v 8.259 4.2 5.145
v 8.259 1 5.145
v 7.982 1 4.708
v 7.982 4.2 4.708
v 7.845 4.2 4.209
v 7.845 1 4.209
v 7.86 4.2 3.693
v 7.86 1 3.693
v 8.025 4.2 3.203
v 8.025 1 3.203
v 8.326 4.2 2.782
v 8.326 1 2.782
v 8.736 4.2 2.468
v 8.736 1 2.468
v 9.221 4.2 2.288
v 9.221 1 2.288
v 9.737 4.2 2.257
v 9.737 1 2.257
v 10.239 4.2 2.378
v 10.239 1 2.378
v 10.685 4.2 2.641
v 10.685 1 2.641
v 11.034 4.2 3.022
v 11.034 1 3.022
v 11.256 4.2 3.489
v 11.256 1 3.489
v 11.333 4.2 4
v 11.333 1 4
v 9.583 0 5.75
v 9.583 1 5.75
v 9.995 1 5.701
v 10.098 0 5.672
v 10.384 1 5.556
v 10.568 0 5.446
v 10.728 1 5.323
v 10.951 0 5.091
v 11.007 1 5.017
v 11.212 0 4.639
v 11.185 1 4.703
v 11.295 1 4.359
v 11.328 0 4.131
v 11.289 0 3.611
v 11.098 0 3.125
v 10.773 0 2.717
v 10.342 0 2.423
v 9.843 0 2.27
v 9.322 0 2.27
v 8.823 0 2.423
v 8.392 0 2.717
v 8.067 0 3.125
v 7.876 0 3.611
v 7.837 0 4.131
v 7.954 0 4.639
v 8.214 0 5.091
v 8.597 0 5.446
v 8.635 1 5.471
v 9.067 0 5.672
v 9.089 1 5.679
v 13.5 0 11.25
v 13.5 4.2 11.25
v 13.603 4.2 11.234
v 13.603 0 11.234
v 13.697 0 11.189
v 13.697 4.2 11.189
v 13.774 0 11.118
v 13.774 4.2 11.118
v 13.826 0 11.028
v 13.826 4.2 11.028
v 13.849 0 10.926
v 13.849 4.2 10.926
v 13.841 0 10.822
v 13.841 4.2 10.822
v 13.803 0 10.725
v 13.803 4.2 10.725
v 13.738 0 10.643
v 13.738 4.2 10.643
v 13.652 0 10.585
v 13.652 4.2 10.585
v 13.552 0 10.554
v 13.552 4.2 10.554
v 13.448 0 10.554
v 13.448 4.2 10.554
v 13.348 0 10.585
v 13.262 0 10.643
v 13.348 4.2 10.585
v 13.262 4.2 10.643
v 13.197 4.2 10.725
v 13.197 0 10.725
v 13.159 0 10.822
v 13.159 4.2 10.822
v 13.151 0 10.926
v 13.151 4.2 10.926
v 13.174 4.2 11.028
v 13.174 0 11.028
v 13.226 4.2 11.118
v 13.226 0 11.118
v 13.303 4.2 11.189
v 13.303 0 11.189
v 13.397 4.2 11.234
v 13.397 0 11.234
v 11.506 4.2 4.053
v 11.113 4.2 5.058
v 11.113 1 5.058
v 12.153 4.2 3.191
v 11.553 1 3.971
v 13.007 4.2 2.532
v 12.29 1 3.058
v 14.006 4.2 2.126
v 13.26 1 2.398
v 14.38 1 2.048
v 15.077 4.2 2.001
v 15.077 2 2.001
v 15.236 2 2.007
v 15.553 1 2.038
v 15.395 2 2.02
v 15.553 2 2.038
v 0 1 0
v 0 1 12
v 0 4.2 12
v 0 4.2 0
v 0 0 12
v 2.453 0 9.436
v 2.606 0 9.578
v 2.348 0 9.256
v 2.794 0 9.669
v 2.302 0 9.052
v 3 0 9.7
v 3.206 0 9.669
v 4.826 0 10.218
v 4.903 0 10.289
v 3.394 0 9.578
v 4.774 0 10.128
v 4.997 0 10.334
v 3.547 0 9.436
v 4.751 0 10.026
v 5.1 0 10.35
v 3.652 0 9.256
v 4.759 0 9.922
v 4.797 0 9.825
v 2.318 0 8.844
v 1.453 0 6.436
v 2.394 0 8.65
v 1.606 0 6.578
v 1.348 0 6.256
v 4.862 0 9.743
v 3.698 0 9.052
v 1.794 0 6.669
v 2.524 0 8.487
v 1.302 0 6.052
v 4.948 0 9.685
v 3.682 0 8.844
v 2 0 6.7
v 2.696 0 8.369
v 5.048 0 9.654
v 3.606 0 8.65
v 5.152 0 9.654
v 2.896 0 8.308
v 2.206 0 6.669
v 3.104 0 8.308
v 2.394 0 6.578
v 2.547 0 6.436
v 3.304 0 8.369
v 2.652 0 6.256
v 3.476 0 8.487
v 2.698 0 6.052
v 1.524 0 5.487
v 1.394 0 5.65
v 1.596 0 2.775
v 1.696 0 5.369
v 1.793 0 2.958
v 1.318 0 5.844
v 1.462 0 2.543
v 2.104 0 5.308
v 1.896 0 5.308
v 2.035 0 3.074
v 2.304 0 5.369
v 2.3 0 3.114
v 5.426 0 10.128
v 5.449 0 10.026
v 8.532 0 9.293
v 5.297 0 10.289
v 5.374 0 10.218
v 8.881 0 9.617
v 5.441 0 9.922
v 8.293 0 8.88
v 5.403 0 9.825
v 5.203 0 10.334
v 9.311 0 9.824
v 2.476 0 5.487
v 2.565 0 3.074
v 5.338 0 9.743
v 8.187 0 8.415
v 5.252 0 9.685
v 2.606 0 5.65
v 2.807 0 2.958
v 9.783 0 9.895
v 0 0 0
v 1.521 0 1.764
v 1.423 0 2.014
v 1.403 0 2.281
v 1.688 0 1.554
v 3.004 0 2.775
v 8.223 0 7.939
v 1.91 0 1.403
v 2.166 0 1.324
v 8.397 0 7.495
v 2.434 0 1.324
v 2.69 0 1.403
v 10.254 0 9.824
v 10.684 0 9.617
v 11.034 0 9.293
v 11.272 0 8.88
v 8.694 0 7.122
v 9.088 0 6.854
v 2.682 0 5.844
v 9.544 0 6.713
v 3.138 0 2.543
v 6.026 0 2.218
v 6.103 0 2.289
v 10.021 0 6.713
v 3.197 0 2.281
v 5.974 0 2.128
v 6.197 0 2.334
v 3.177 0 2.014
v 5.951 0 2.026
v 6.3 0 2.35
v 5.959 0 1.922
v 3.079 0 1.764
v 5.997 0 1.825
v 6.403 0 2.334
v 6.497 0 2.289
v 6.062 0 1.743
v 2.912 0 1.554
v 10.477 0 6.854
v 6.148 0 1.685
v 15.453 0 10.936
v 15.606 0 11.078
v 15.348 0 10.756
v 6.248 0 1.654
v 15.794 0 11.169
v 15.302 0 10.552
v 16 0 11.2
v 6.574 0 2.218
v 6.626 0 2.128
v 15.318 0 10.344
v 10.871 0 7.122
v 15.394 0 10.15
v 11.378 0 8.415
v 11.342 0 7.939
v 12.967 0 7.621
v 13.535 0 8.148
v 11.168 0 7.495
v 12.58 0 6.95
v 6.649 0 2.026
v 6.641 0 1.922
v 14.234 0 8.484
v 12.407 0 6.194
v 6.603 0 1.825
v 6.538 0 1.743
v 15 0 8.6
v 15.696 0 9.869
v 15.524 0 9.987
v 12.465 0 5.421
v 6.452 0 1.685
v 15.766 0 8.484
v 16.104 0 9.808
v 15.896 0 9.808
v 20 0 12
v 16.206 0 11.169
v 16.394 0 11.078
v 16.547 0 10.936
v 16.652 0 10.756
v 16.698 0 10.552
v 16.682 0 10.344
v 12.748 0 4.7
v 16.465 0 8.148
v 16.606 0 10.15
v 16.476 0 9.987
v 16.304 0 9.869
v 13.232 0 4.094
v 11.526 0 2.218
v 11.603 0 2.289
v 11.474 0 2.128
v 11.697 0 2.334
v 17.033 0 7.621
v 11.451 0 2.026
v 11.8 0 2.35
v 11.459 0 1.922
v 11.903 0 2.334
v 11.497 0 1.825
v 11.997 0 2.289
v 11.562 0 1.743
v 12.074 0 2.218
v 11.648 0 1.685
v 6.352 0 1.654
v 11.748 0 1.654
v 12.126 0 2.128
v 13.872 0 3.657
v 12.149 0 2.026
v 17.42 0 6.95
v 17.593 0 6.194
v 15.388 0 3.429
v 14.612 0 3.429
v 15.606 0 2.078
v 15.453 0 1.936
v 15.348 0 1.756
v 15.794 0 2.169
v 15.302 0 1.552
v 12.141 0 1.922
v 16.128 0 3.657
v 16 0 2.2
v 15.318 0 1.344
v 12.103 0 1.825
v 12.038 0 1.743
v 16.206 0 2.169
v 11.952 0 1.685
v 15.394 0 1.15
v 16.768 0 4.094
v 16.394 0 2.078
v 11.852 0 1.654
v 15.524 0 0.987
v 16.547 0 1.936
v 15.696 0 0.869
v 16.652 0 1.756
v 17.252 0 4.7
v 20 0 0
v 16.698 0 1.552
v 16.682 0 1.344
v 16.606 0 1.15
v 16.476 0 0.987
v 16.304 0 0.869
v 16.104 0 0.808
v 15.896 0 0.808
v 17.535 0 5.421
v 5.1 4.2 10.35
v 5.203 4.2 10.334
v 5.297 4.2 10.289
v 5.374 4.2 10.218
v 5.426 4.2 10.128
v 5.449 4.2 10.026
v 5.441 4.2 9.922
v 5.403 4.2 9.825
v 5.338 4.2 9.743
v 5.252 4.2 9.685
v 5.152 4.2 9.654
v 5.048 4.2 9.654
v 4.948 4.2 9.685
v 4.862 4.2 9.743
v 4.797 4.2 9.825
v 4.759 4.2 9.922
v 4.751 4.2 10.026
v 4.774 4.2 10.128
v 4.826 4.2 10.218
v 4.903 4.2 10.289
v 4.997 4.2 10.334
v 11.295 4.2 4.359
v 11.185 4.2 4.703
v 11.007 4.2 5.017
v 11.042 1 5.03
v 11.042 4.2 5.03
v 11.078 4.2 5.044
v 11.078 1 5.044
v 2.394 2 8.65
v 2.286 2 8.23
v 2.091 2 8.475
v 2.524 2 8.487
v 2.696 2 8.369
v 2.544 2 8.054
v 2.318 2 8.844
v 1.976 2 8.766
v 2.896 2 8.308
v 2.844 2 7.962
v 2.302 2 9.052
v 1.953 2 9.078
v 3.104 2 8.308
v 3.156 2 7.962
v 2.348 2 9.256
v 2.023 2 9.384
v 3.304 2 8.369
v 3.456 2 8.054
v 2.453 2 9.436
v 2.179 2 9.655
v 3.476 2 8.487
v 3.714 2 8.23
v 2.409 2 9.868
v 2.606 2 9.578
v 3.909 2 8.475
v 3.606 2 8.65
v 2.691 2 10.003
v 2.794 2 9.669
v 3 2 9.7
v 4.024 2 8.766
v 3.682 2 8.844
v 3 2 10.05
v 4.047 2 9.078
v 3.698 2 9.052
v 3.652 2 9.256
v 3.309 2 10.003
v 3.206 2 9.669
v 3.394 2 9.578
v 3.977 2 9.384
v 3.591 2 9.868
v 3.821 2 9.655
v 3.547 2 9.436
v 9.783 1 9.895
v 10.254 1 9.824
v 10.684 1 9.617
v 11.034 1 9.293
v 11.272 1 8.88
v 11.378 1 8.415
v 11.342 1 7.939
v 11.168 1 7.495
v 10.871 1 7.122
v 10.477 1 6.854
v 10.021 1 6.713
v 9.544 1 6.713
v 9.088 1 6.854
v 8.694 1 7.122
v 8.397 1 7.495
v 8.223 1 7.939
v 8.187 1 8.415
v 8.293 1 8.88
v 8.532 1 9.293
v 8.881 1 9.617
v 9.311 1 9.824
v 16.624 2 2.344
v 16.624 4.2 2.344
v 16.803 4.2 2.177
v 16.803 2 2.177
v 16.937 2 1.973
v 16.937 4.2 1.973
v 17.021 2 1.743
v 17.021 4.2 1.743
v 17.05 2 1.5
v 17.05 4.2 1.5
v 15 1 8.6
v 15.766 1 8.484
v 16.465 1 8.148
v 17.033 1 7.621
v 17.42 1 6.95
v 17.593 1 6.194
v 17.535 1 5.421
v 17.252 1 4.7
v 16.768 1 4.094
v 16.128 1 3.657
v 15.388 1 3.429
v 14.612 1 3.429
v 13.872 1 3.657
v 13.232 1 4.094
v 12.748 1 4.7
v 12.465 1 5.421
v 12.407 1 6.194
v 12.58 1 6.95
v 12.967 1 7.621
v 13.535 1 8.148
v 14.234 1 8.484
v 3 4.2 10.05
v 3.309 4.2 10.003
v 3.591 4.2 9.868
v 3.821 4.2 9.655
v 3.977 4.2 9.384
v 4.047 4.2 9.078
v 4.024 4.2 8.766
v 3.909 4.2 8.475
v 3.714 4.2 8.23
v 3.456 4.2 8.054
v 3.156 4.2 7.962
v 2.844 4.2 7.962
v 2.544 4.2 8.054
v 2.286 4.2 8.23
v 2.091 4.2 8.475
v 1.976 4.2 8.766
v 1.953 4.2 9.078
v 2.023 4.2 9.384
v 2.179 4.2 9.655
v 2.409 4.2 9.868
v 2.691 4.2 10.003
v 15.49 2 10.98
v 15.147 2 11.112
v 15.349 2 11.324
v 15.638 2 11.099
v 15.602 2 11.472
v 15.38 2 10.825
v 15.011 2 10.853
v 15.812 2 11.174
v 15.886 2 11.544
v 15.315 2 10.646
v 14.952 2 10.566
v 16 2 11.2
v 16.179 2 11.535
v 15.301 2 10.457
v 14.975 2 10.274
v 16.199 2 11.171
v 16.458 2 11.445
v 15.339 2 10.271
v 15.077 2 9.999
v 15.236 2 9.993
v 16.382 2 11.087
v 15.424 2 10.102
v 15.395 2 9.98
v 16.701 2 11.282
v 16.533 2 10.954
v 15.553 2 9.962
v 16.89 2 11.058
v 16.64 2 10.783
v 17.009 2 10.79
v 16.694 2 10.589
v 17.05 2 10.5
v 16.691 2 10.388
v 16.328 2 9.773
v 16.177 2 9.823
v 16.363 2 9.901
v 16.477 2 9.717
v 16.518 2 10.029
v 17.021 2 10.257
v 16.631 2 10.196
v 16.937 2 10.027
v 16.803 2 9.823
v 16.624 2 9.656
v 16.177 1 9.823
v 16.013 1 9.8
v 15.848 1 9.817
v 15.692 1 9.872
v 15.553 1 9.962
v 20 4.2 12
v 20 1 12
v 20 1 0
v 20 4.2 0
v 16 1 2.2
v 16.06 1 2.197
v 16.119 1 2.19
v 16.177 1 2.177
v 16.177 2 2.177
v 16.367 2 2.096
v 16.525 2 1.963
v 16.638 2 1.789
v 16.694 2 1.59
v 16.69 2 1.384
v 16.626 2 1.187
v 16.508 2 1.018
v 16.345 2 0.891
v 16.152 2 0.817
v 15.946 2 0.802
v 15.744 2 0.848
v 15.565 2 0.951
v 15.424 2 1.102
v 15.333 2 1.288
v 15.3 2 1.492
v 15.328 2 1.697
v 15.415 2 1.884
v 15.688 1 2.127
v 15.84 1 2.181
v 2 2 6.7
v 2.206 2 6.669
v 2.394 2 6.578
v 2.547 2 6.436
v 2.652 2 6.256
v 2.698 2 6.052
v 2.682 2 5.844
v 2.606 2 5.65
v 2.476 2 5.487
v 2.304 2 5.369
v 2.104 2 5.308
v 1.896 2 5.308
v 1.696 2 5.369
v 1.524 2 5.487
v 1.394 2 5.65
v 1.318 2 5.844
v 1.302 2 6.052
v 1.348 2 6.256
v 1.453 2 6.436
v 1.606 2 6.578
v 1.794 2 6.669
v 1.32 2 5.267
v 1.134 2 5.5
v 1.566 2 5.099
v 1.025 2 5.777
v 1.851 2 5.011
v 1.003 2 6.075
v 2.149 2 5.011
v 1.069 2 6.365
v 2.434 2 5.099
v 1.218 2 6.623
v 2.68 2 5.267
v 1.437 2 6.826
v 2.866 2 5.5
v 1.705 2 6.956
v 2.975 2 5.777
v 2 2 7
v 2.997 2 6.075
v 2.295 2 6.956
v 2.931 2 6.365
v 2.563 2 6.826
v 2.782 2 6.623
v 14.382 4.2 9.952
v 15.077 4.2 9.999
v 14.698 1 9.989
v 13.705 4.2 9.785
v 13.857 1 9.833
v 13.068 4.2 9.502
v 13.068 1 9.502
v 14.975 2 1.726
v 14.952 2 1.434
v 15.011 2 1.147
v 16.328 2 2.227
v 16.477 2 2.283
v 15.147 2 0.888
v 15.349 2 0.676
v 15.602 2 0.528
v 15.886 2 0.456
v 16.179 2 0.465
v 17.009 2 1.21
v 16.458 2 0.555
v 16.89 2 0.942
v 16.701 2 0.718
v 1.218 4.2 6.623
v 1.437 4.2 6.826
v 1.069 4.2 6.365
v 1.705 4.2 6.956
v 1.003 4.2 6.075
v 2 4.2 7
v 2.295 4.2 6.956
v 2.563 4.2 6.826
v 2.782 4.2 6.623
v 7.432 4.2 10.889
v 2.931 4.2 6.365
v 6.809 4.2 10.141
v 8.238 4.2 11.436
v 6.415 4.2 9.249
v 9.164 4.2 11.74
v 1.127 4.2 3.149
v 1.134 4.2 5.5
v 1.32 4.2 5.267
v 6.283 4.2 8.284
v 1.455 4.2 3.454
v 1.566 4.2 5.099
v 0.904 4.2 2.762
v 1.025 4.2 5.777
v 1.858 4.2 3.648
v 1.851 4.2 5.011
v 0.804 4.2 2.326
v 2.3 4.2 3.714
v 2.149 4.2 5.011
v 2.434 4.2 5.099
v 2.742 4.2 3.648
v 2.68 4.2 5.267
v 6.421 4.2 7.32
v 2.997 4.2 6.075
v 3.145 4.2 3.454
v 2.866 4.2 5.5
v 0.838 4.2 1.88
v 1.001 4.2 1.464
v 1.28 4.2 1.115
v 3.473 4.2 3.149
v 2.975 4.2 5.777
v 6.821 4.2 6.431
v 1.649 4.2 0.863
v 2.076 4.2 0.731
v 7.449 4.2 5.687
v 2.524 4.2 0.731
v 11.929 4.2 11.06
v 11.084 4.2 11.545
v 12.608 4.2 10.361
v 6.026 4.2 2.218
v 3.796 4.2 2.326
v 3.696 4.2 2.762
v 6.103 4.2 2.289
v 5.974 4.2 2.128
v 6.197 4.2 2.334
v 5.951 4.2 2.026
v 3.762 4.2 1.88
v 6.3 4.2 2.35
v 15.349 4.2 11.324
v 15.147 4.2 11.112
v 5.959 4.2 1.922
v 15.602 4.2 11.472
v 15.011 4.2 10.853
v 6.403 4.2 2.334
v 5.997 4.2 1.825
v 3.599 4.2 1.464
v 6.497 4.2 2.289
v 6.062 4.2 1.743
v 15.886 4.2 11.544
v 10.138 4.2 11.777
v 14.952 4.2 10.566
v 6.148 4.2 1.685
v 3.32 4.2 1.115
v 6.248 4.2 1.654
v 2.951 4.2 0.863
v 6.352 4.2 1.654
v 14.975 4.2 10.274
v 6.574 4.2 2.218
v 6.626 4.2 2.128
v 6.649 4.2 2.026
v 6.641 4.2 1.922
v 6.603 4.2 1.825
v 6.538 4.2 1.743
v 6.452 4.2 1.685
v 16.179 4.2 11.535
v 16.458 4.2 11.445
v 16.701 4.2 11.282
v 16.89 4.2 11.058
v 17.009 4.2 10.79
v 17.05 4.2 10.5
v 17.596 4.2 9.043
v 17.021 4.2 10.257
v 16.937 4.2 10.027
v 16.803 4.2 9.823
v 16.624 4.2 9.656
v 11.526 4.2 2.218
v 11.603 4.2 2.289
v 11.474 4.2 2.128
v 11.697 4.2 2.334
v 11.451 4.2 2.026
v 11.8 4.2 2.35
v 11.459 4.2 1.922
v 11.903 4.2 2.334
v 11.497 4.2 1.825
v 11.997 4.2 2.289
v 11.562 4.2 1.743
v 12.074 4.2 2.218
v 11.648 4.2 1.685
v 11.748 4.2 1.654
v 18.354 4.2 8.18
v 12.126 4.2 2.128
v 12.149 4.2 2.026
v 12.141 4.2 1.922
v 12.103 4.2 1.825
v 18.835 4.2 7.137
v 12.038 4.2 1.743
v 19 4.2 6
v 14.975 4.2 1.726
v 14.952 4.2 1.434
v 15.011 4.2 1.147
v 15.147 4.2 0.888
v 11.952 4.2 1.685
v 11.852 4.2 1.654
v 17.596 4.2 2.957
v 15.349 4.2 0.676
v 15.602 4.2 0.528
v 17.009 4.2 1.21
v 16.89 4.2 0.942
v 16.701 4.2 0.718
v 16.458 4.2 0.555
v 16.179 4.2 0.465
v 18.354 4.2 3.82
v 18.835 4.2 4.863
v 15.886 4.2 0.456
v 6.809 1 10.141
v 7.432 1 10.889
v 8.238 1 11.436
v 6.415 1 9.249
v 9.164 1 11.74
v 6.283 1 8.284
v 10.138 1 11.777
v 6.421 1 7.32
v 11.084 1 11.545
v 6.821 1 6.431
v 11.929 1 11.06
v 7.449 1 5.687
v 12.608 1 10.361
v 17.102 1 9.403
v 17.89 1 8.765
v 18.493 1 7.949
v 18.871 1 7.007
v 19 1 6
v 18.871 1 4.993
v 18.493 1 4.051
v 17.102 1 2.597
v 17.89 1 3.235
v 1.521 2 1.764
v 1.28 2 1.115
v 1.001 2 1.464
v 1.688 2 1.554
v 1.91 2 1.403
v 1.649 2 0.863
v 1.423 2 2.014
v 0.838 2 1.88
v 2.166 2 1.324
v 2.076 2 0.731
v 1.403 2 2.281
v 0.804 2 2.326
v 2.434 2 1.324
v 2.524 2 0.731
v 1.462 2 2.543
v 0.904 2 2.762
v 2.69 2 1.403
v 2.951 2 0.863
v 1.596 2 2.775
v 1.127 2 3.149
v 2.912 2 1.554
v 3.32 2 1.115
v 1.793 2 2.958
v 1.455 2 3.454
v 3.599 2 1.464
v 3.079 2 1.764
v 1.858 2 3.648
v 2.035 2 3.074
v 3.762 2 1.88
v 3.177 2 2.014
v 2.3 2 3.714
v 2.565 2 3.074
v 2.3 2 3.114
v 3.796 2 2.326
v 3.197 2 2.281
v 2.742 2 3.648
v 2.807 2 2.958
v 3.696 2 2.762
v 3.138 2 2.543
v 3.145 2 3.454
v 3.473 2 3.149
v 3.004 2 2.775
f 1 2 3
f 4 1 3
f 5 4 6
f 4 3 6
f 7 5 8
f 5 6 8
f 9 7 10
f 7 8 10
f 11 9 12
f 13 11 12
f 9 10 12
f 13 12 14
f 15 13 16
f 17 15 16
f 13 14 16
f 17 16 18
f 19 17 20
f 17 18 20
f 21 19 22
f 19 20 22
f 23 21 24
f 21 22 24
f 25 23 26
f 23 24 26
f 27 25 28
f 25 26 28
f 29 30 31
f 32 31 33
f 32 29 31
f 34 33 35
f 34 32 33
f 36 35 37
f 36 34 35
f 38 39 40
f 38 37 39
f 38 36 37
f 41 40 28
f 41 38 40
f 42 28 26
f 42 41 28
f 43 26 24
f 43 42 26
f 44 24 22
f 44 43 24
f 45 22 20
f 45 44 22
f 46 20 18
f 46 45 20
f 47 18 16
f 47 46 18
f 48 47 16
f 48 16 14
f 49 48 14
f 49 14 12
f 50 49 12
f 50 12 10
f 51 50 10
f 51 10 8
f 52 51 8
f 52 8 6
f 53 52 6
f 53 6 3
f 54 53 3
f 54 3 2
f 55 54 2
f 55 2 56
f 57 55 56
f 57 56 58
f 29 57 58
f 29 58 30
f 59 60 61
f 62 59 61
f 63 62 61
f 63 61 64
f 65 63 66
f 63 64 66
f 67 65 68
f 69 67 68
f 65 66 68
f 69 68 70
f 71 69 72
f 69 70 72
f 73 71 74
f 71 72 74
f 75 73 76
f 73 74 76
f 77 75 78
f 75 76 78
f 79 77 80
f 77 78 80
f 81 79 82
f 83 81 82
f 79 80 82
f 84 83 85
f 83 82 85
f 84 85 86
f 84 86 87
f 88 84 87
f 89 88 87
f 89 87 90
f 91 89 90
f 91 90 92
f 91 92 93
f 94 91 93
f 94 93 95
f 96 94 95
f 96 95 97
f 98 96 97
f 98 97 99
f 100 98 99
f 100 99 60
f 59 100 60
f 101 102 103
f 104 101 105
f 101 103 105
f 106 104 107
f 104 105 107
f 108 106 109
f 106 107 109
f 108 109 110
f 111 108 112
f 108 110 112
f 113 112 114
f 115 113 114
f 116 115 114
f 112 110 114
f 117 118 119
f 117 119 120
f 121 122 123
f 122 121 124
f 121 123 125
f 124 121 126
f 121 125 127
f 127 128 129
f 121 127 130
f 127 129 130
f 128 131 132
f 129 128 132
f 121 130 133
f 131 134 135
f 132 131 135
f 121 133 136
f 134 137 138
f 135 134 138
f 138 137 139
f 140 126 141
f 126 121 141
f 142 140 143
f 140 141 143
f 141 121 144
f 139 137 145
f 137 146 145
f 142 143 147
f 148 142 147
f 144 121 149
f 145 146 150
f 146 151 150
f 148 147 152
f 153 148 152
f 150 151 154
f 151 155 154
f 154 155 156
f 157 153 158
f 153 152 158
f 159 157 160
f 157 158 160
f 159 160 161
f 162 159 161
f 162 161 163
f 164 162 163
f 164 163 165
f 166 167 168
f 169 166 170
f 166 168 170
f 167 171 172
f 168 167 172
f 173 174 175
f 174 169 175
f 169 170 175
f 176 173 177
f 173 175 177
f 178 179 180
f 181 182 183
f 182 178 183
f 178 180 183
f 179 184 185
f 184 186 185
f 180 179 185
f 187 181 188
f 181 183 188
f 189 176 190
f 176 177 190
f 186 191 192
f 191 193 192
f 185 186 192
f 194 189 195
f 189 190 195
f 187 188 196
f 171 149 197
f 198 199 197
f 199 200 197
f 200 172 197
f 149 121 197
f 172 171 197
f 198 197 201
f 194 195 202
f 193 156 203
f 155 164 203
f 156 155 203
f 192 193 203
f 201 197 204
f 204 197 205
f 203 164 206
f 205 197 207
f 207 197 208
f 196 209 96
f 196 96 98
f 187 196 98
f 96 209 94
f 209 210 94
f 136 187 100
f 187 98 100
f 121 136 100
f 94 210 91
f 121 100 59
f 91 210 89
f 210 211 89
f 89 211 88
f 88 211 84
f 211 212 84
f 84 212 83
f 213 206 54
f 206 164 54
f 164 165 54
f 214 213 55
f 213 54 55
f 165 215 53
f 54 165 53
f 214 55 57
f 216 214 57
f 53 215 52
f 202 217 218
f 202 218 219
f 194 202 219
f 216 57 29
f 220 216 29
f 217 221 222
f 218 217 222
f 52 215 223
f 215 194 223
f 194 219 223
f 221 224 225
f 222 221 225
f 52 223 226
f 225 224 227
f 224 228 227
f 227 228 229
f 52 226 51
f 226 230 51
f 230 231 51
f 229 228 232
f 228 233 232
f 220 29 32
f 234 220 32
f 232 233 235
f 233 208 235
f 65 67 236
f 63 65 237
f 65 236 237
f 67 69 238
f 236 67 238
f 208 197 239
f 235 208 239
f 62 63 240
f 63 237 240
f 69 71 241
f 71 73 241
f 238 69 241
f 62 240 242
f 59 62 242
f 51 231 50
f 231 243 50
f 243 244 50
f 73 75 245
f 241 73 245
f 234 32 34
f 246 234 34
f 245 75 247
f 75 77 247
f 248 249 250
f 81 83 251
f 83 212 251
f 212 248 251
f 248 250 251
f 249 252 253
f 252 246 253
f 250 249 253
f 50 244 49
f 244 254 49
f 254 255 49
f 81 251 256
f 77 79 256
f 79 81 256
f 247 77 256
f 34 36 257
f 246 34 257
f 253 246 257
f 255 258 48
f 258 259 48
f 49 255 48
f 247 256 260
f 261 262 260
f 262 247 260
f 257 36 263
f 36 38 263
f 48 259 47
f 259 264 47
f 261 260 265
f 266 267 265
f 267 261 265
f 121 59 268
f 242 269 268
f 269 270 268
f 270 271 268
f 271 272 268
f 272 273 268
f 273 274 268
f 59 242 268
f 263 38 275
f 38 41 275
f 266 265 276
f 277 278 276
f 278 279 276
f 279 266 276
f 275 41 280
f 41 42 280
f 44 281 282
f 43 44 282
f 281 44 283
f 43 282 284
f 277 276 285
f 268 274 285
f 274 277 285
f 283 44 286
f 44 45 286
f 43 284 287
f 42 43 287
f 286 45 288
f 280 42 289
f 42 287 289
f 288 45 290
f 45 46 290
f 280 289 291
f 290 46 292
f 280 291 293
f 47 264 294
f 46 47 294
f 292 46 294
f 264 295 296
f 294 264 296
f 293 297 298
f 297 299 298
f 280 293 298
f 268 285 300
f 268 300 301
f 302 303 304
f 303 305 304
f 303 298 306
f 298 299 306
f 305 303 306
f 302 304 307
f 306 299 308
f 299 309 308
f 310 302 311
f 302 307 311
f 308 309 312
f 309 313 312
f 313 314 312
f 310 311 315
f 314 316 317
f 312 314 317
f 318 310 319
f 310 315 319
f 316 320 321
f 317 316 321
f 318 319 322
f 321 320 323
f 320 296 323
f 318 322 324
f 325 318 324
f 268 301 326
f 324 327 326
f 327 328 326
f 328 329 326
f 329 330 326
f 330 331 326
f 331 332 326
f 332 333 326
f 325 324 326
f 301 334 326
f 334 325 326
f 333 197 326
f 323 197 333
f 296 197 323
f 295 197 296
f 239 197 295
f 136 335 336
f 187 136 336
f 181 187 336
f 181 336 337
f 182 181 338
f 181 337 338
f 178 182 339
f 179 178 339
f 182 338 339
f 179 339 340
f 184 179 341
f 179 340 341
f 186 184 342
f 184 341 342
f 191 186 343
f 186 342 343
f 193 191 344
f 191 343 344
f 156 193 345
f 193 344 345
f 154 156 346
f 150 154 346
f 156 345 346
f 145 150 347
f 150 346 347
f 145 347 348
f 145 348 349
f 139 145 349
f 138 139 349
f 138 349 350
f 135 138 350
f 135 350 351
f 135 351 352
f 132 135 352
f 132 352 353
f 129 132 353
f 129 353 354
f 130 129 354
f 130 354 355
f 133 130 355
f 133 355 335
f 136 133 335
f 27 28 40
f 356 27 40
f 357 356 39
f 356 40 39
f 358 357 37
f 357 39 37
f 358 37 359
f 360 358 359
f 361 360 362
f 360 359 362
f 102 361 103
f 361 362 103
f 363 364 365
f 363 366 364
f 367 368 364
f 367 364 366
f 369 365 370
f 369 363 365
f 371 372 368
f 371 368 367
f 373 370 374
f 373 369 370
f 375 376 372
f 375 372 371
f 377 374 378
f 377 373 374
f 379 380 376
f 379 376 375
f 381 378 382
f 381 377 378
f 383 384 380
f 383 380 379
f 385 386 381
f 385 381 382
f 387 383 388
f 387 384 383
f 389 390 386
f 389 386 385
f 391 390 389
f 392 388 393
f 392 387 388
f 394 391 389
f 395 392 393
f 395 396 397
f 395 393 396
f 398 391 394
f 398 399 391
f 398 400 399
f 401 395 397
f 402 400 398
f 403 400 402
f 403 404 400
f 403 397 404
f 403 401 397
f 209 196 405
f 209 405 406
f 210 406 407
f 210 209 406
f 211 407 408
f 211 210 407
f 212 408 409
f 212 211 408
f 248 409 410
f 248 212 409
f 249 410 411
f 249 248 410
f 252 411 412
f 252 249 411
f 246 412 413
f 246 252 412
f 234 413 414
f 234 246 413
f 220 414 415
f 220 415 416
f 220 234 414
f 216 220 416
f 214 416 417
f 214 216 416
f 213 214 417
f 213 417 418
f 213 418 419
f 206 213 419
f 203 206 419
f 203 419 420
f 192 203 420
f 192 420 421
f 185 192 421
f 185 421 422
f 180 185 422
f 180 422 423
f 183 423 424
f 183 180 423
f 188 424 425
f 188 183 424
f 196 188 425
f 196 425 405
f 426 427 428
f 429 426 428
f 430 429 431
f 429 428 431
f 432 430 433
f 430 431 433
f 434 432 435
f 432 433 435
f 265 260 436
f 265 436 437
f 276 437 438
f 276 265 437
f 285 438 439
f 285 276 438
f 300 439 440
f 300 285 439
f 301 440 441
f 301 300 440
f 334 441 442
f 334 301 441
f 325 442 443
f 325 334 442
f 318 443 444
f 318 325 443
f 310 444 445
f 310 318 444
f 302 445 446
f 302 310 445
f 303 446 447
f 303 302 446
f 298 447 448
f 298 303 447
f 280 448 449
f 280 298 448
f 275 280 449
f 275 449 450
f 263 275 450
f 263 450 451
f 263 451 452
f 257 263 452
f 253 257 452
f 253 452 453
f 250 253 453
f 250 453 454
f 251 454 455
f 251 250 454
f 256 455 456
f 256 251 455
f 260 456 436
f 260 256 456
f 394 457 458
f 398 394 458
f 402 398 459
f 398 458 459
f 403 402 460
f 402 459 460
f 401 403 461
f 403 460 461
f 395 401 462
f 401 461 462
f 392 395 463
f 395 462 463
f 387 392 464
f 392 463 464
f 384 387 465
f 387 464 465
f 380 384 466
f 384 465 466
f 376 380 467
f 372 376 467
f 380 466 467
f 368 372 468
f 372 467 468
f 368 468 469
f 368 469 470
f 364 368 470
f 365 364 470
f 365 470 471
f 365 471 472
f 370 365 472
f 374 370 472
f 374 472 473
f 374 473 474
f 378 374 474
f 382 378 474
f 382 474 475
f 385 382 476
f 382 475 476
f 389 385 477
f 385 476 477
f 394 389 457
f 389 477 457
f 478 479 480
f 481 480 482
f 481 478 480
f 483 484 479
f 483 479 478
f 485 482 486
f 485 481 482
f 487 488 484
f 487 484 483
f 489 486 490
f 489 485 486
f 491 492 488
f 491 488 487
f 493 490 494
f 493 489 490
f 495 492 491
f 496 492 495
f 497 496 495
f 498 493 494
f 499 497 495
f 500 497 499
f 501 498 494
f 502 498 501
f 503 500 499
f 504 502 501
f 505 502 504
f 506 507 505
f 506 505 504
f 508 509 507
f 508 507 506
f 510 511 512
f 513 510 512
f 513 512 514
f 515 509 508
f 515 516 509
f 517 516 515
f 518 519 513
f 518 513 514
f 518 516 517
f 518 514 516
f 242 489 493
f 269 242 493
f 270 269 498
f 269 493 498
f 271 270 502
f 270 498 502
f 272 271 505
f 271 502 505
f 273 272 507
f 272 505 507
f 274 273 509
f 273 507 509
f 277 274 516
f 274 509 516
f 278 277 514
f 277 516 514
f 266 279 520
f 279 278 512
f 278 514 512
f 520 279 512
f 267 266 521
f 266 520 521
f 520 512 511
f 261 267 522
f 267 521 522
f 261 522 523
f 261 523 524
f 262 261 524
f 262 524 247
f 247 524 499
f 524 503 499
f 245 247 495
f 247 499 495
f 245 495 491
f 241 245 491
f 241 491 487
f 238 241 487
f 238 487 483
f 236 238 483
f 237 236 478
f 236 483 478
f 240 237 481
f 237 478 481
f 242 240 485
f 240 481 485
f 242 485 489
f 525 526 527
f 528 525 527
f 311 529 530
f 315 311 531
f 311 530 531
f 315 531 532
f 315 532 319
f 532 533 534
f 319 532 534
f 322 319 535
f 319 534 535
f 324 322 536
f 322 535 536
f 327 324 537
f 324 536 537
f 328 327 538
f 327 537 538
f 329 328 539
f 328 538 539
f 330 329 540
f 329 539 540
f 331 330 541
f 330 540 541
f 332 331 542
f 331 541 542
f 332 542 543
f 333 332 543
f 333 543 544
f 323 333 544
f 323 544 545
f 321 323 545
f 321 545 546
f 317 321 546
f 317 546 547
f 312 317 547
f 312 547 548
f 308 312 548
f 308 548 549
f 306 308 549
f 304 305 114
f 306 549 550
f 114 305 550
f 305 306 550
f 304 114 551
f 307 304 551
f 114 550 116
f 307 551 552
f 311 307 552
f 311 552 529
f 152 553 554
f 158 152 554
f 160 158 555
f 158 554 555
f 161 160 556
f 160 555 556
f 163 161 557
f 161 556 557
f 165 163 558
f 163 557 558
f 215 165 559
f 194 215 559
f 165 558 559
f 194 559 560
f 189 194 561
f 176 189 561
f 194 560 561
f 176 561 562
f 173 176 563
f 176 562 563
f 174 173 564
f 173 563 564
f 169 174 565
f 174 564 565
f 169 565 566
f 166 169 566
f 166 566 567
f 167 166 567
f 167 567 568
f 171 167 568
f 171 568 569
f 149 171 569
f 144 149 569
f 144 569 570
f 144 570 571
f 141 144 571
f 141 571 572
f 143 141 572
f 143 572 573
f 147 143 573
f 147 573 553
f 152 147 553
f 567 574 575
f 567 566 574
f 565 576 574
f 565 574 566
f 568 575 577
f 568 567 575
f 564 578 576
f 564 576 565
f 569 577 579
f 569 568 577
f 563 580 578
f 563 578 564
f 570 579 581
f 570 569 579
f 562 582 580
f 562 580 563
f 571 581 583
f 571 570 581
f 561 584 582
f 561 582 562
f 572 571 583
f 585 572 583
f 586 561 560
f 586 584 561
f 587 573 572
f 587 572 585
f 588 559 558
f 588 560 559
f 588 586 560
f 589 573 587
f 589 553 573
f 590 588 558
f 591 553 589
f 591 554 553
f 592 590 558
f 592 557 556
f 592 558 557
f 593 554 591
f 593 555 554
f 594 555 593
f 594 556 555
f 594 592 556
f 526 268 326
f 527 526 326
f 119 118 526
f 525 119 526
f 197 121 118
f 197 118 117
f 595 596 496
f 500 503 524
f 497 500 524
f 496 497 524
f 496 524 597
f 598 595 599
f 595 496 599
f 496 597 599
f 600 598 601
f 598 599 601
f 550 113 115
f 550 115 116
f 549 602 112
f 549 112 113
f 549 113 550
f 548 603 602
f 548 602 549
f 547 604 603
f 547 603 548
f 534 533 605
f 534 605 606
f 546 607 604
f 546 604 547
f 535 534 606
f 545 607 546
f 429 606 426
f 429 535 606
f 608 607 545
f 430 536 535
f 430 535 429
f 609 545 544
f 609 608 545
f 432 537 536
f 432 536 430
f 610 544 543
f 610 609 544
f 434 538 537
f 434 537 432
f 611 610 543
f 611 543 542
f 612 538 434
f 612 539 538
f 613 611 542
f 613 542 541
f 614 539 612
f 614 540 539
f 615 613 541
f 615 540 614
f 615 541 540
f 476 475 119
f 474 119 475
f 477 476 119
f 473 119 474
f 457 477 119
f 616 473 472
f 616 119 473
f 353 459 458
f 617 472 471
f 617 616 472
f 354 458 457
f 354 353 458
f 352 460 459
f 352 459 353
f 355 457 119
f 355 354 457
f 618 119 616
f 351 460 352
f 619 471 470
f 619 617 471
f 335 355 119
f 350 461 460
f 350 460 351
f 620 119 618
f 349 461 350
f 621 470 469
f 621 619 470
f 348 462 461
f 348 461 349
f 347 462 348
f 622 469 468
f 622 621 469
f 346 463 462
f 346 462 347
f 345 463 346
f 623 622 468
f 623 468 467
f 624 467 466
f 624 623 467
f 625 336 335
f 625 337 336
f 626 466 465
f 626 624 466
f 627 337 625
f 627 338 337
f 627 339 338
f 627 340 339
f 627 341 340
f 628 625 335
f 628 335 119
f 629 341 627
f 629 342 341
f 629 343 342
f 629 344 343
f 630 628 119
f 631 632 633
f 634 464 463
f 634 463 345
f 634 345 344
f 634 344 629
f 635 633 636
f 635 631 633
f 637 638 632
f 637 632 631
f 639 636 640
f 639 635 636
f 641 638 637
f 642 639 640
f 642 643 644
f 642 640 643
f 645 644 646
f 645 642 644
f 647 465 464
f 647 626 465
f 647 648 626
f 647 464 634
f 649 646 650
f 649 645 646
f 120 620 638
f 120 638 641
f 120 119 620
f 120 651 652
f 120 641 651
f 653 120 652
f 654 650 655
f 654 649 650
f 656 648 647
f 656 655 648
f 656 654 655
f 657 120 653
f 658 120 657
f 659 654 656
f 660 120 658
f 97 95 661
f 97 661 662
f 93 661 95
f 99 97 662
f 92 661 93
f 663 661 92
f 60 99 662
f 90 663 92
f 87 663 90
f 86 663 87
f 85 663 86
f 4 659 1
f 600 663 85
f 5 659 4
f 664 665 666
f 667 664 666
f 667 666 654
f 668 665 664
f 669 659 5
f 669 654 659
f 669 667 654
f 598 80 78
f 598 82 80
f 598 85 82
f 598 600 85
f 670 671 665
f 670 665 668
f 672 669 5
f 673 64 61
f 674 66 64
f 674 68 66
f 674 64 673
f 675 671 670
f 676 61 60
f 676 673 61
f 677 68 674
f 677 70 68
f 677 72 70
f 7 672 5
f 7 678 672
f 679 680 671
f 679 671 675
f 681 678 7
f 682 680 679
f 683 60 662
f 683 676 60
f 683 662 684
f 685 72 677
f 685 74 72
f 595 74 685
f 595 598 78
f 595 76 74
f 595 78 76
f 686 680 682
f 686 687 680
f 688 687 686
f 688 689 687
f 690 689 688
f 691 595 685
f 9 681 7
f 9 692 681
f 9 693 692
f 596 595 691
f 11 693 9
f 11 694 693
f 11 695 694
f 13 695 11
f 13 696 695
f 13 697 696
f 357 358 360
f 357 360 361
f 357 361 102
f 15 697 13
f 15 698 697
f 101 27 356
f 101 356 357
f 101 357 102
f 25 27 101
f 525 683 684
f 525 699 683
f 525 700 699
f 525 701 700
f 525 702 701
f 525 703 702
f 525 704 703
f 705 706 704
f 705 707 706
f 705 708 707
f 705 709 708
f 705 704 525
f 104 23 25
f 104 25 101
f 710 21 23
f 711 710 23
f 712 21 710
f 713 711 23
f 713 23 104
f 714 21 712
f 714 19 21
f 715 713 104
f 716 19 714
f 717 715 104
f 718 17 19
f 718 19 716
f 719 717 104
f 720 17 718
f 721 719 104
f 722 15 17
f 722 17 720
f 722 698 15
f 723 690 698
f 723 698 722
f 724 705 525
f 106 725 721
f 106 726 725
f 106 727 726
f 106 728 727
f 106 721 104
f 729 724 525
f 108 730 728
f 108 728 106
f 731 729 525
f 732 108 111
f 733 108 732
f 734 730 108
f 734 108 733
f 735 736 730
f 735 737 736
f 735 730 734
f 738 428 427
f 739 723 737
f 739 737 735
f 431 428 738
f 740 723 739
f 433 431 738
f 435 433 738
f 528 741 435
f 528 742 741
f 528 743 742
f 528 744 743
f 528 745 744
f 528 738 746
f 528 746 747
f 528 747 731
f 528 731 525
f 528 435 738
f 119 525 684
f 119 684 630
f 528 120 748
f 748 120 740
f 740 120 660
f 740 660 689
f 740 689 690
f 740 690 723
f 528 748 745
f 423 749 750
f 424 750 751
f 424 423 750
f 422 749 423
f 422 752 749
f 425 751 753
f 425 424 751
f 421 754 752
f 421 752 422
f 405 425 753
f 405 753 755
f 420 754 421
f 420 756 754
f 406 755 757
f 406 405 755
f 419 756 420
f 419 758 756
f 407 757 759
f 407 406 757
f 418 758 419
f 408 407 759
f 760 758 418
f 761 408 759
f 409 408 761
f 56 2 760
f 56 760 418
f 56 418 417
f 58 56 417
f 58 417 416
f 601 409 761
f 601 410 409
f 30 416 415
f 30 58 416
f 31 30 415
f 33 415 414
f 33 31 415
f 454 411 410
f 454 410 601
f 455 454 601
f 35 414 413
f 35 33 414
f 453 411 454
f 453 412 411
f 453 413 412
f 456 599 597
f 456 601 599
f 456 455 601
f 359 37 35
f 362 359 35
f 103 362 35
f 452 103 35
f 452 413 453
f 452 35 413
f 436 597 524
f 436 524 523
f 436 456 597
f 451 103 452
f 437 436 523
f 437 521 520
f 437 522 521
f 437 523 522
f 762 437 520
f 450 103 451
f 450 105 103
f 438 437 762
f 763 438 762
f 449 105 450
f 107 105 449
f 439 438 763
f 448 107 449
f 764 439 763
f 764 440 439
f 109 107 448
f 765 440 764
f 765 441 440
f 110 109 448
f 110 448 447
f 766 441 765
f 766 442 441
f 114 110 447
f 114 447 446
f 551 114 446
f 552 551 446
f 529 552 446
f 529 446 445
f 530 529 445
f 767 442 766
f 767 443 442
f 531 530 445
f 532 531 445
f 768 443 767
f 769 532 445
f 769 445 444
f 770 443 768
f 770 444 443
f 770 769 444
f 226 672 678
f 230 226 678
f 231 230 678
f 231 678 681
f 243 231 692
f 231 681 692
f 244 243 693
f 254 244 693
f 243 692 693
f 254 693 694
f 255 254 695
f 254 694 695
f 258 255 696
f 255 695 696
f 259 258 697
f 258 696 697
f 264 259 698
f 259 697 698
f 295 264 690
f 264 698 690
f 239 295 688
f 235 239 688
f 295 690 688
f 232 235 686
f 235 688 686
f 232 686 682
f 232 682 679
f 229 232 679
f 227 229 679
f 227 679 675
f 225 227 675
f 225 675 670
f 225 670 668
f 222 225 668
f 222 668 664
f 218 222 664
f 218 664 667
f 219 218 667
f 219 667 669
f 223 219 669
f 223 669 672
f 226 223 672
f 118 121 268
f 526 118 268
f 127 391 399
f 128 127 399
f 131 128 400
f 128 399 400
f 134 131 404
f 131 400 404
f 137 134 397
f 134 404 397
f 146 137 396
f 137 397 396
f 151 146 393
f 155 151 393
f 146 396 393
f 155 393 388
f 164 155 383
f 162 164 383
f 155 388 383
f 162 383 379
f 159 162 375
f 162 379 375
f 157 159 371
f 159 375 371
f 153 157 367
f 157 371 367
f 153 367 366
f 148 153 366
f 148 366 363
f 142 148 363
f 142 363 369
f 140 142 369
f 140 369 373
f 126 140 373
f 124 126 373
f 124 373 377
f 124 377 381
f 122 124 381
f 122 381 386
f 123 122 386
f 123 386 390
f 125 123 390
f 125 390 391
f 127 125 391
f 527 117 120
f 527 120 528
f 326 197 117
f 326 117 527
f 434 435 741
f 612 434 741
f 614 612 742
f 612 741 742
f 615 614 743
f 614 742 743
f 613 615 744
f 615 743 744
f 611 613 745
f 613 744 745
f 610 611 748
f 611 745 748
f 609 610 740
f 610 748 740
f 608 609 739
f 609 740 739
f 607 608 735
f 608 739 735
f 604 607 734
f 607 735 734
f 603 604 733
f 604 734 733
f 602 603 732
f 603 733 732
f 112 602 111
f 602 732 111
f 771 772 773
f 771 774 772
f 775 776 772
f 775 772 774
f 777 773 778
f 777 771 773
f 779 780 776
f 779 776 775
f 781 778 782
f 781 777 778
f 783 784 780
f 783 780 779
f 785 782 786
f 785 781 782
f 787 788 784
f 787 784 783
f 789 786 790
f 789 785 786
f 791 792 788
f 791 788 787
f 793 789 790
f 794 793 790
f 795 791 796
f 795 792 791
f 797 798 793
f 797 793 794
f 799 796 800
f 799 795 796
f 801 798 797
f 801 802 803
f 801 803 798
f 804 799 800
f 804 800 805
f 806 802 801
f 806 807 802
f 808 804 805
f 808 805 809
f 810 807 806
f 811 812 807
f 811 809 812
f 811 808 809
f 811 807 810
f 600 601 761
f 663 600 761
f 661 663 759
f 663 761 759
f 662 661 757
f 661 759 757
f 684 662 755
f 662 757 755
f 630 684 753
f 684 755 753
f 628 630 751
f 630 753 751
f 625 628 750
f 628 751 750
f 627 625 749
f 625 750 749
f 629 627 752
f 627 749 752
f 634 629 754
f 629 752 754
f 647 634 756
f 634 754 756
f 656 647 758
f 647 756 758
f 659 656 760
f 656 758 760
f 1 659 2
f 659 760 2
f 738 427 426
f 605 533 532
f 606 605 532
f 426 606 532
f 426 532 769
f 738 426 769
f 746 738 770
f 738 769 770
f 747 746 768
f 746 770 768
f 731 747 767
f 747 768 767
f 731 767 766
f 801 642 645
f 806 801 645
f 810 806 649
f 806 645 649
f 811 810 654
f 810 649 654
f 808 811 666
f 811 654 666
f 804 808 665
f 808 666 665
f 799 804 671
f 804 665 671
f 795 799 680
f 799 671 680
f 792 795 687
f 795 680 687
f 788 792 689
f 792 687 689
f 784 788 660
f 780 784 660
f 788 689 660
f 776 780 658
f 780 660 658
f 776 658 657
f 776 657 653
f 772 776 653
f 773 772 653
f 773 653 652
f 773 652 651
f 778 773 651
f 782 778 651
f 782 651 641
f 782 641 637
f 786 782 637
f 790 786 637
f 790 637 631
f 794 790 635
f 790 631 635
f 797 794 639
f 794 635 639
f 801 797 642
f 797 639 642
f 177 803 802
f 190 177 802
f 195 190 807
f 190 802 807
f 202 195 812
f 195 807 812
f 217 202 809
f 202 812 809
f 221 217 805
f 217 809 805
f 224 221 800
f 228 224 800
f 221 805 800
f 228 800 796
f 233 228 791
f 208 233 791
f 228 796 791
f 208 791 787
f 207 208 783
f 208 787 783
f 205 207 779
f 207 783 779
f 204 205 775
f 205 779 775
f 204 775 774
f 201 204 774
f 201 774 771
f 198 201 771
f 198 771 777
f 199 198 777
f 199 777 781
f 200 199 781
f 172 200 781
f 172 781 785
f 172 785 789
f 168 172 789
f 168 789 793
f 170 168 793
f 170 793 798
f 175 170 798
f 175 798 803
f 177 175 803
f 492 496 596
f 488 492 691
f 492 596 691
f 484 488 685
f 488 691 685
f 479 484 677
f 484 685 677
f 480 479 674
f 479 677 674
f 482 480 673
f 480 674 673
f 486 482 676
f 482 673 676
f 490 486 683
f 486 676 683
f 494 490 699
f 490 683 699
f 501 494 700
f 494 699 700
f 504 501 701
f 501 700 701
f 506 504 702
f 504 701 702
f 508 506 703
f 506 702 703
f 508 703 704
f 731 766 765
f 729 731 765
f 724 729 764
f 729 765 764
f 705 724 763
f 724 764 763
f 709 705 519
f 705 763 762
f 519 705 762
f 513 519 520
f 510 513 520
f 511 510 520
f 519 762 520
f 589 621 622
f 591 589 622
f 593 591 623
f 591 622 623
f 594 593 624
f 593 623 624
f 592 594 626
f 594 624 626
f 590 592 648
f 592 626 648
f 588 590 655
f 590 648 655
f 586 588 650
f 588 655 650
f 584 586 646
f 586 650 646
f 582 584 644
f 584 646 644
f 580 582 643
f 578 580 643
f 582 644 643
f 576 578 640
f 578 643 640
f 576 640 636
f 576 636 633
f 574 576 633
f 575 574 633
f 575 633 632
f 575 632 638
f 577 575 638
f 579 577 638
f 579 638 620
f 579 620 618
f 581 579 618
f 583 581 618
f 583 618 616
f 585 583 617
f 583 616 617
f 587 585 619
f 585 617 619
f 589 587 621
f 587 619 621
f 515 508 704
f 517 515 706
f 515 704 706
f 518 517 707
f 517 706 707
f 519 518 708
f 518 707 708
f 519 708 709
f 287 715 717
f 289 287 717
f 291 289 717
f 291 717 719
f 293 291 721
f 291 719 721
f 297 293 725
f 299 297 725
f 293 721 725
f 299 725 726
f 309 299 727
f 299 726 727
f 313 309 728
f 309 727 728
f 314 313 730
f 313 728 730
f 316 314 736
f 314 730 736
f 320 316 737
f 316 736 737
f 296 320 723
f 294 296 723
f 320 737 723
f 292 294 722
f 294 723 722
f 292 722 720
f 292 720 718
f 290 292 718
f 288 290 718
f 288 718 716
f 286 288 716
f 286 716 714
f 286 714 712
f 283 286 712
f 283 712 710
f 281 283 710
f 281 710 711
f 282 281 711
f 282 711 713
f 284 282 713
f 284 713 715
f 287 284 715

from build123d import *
from build123d.topology import SkipClean

# Parameters (mm, degrees)
SKETCH_1_W          = 20
SKETCH_1_H          = 12
SKETCH_1_R          = 1.75
SKETCH_1_R_2        = 1.6
SKETCH_1_R_3        = 2.6
EXTRUDE_1_DEPTH     = 1
EXTRUDE_START       = 1
SKETCH_1_6_W        = 20
SKETCH_1_6_H        = 12
EXTRUDE_2_DEPTH     = 3.2
SKETCH_4_R          = 0.9
SKETCH_4_R_2        = 0.35
SKETCH_4_R_3        = 0.7
CUT_EXTRUDE_1_DEPTH = 24.698945124
SKETCH_4_3_R        = 1.5
SKETCH_4_3_R_2      = 1
SKETCH_4_3_R_3      = 1.05
CUT_EXTRUDE_4_DEPTH = 2.2


with BuildPart() as part:
    # 草图1 → 凸台-拉伸1 (new body)
    with BuildSketch(Plane(origin=(0, 0, 0), x_dir=(1, 0, 0), z_dir=(0, 1, 0))):
        with Locations((10, -6)):
            Rectangle(SKETCH_1_W, SKETCH_1_H)
        with Locations(Location((9.582575695, -4, 0), (0, 0, 270))):
            Circle(SKETCH_1_R, mode=Mode.SUBTRACT)
        with Locations(Location((9.782588007, -8.295345746, 0), (0, 0, 270))):
            Circle(SKETCH_1_R_2, mode=Mode.SUBTRACT)
        with Locations(Location((15, -6, 0), (0, 0, 270))):
            Circle(SKETCH_1_R_3, mode=Mode.SUBTRACT)
    extrude(amount=EXTRUDE_1_DEPTH)

    # 草图1<6> → 凸台-拉伸2 (add)
    with SkipClean():  # the faces are left unmerged after this step: merging them gives an invalid solid
        with BuildSketch(Plane(origin=(0, 0, 0), x_dir=(1, 0, 0), z_dir=(0, 1, 0)).offset(EXTRUDE_START)):
            with Locations((10, -6)):
                Rectangle(SKETCH_1_6_W, SKETCH_1_6_H)
            with BuildLine():
                ThreePointArc((8.258713369, -5.144503622), (8.971944493, -2.359990995), (11.332575695, -4))
                ThreePointArc((11.332575695, -4), (11.249212779, -4.53368608), (11.007066173, -5.01652687))
                ThreePointArc((11.007066173, -5.01652687), (11.059967321, -5.036772118), (11.112533909, -5.05787082))
                ThreePointArc((11.112533909, -5.05787082), (15.47441313, -2.028233116), (19, -6))
                ThreePointArc((19, -6), (17.033646838, -9.444456494), (13.067859731, -9.502404029))
                ThreePointArc((13.067859731, -9.502404029), (7.432385055, -10.888904322), (8.258713369, -5.144503622))
            make_face(mode=Mode.SUBTRACT)
        extrude(amount=EXTRUDE_2_DEPTH)

    # 草图4 → 切除-拉伸1 (cut, through all)
    with SkipClean():  # the faces are left unmerged after this step: merging them gives an invalid solid
        with BuildSketch(Plane(origin=(0, 4.2, 0), x_dir=(1, 0, 0), z_dir=(0, 1, 0))):
            with Locations(Location((2.3, -2.214171161, 0), (0, 0, 270))):
                Circle(SKETCH_4_R)
            with Locations(Location((6.3, -2, 0), (0, 0, 270))):
                Circle(SKETCH_4_R_2)
            with Locations(Location((5.1, -10, 0), (0, 0, 270))):
                Circle(SKETCH_4_R_2)
            with Locations(Location((11.8, -2, 0), (0, 0, 270))):
                Circle(SKETCH_4_R_2)
            with Locations(Location((2, -6, 0), (0, 0, 270))):
                Circle(SKETCH_4_R_3)
            with Locations(Location((16, -1.5, 0), (0, 0, 270))):
                Circle(SKETCH_4_R_3)
            with Locations(Location((16, -10.5, 0), (0, 0, 270))):
                Circle(SKETCH_4_R_3)
            with Locations(Location((3, -9, 0), (0, 0, 270))):
                Circle(SKETCH_4_R_3)
            with Locations(Location((13.5, -10.9, 0), (0, 0, 270))):
                Circle(SKETCH_4_R_2)
        extrude(amount=-CUT_EXTRUDE_1_DEPTH, mode=Mode.SUBTRACT)

    # 草图4<3> → 切除-拉伸4 (cut)
    with SkipClean():  # the faces are left unmerged after this step: merging them gives an invalid solid
        with BuildSketch(Plane(origin=(0, 4.2, 0), x_dir=(1, 0, 0), z_dir=(0, 1, 0))):
            with Locations(Location((2.3, -2.214171161, 0), (0, 0, 270))):
                Circle(SKETCH_4_3_R)
            with Locations(Location((2, -6, 0), (0, 0, 270))):
                Circle(SKETCH_4_3_R_2)
            with Locations((16, -1.5)):
                Circle(SKETCH_4_3_R_3)
            with Locations((16, -10.5)):
                Circle(SKETCH_4_3_R_3)
            with Locations(Location((3, -9, 0), (0, 0, 270))):
                Circle(SKETCH_4_3_R_3)
        extrude(amount=-CUT_EXTRUDE_4_DEPTH, mode=Mode.SUBTRACT)


solid = part.part
